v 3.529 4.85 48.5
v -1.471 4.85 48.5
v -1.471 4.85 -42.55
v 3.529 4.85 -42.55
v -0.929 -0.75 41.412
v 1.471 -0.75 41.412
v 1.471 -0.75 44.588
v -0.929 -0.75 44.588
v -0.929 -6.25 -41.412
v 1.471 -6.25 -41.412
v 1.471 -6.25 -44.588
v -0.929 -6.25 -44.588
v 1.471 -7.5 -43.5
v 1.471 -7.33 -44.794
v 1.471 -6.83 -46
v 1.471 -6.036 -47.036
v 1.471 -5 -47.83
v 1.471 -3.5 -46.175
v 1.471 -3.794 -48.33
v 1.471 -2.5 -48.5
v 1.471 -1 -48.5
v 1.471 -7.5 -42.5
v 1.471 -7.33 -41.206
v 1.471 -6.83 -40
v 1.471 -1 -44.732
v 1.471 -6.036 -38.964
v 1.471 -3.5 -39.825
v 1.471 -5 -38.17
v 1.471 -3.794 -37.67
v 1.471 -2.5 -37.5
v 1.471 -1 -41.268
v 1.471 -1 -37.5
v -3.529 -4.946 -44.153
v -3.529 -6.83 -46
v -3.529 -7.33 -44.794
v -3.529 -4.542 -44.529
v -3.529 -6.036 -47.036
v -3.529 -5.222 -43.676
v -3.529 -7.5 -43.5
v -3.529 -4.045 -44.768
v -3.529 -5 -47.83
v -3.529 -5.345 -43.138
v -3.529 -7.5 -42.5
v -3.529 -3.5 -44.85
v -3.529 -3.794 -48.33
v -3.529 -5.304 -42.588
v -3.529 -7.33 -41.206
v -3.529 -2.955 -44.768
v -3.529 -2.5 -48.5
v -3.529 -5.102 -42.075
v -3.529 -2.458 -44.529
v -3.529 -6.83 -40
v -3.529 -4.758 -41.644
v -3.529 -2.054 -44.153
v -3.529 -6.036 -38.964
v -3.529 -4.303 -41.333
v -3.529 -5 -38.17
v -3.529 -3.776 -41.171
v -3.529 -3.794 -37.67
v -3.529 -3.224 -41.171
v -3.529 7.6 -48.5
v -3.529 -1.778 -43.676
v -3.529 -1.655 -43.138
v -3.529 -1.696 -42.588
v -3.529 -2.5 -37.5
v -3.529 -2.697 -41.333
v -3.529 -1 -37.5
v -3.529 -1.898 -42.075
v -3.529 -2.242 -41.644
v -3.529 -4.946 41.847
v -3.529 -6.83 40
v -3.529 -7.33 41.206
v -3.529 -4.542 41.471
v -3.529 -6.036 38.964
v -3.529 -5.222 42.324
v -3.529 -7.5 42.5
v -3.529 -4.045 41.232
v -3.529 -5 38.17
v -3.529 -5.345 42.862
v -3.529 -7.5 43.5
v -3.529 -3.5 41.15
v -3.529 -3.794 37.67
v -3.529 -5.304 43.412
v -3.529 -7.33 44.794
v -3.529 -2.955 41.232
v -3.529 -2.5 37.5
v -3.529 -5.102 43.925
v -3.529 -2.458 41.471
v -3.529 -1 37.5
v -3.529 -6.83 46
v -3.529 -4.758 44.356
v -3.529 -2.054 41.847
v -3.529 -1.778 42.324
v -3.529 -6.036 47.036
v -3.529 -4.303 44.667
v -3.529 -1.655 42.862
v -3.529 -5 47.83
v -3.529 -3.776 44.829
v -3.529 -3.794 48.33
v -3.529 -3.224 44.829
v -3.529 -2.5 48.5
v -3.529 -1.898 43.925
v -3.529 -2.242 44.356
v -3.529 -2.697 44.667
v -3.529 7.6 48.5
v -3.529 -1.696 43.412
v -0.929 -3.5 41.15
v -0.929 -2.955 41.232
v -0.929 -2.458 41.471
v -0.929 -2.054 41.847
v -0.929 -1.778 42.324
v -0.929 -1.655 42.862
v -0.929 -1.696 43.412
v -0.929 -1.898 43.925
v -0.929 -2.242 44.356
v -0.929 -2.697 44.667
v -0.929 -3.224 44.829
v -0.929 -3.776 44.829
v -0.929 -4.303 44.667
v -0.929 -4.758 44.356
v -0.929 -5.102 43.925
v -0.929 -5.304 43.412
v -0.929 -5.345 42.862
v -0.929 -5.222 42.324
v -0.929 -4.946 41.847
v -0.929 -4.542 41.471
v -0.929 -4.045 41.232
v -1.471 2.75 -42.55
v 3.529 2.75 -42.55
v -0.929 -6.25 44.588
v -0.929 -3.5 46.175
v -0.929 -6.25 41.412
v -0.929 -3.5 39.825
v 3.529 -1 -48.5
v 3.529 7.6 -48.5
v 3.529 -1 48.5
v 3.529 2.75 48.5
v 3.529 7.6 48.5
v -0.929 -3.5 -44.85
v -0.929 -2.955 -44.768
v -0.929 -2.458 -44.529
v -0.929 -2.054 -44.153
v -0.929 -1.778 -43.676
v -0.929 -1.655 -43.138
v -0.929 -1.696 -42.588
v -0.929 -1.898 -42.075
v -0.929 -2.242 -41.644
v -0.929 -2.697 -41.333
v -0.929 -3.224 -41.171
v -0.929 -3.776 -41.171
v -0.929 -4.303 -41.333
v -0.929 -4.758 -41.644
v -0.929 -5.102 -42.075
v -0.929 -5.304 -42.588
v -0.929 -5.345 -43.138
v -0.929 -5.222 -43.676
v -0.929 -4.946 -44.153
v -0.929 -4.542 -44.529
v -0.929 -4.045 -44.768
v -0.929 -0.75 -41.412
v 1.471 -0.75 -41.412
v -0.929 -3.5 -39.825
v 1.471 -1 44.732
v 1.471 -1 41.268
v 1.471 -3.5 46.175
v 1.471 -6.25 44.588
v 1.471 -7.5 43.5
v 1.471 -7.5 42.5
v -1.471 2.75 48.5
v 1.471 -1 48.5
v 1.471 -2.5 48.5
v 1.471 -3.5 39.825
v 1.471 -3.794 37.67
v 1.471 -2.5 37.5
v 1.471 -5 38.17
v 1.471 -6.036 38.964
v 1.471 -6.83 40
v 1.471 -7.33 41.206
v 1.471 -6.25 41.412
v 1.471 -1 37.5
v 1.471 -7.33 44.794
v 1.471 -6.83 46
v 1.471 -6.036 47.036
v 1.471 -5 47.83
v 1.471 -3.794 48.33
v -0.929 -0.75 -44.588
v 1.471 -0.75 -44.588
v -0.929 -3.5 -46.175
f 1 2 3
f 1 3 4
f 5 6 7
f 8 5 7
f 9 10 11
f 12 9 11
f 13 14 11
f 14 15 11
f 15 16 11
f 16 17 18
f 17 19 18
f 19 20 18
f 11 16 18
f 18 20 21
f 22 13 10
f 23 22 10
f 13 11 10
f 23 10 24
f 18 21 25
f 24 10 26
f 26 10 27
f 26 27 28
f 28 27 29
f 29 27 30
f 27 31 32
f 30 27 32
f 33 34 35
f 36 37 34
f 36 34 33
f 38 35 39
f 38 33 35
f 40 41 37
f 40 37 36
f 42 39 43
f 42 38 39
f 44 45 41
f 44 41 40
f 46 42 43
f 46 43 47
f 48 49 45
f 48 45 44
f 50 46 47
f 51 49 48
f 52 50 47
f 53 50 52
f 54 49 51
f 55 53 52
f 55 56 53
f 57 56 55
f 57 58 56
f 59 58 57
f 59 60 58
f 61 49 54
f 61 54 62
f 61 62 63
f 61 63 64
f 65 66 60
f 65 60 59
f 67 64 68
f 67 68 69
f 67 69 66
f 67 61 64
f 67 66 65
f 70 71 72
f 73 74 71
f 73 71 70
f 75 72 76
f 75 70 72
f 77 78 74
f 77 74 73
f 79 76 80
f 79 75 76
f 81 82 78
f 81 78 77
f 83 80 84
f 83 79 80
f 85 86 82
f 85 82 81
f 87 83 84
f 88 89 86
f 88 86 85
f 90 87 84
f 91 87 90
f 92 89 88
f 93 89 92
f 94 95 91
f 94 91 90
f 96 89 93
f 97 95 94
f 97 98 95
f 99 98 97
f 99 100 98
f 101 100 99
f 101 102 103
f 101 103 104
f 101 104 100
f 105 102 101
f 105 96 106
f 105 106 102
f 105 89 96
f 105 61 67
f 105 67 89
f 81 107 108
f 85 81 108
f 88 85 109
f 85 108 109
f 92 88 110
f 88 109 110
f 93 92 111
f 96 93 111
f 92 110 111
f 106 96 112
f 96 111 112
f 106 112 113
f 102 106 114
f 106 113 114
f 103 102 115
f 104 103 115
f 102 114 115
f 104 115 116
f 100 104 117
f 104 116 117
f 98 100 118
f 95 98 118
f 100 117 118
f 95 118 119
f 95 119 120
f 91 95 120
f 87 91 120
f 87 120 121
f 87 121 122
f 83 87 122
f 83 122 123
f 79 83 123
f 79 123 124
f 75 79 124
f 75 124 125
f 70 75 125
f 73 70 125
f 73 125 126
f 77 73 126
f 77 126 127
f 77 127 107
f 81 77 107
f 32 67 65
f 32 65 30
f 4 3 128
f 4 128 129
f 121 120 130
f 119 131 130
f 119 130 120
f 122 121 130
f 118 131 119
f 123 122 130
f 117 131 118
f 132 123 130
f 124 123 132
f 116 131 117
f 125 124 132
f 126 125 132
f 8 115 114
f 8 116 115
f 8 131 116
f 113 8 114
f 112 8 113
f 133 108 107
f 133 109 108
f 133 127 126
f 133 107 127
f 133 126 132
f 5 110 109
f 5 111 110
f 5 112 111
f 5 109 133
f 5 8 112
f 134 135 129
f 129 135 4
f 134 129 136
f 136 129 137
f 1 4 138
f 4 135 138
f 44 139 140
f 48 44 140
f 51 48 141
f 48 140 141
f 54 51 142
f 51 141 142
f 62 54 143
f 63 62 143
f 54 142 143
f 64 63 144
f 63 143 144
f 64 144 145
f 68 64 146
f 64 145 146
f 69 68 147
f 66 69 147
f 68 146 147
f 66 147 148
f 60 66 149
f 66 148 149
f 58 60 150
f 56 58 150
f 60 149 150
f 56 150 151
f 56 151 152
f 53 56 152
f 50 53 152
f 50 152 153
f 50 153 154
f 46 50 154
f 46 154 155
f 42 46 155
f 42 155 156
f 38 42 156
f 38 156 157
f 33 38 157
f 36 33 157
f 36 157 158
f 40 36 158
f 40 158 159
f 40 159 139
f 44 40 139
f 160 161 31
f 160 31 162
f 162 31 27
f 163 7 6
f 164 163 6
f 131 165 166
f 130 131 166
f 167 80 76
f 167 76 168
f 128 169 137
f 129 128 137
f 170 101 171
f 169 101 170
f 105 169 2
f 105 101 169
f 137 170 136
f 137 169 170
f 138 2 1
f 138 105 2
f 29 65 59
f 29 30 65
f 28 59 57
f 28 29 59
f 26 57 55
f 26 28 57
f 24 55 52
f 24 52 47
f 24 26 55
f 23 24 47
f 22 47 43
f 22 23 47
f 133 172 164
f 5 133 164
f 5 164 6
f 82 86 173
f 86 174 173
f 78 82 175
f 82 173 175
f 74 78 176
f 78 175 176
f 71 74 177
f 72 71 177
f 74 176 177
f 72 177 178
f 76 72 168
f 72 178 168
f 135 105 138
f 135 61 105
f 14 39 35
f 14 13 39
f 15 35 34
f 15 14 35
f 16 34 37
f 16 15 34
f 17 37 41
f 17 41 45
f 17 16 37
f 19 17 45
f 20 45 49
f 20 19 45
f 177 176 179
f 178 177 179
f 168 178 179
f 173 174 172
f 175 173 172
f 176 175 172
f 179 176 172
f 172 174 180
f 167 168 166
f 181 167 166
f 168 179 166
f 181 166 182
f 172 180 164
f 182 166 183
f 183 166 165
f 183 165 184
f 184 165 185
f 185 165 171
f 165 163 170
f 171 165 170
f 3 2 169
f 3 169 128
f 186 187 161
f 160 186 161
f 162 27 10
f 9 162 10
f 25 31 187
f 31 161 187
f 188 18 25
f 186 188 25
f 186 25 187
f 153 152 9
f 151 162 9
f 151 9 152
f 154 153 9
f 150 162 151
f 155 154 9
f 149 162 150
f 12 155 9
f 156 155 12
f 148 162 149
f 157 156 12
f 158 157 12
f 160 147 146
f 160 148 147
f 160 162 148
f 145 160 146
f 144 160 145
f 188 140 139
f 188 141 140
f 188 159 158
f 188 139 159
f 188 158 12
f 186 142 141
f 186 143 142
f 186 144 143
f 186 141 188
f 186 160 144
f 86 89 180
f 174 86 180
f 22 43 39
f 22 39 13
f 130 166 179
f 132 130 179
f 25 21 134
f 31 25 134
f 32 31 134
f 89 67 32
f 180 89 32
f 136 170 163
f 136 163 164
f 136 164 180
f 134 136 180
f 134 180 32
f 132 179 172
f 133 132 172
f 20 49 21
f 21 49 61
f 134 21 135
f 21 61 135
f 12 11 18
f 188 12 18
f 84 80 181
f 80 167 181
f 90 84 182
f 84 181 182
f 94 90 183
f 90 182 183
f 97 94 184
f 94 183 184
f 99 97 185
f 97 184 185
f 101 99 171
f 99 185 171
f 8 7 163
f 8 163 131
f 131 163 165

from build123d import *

# Parameters (mm, degrees)
SKETCH1_W           = 7.0575
SKETCH1_H           = 97
BOSS_EXTRUDE2_DEPTH = 7.6
SKETCH4_W           = 5
SKETCH4_H           = 91.05
CUT_EXTRUDE1_DEPTH  = 4.85
SKETCH6_W           = 5
SKETCH6_H           = 91.05
BOSS_EXTRUDE3_DEPTH = 2.75
SKETCH8_W           = 7.0575
SKETCH8_H           = 97
BOSS_EXTRUDE4_DEPTH = 1
SKETCH9_W           = 5
SKETCH9_H           = 11
BOSS_EXTRUDE5_DEPTH = 6.5
CUT_EXTRUDE2_DEPTH  = 2.4
SKETCH11_R          = 1.85
CUT_EXTRUDE3_DEPTH  = 50.293805962
FILLET2_R           = 5


with BuildPart() as part:
    # Sketch1 → Boss-Extrude2 (new body)
    with BuildSketch(Plane(origin=(0, 0, 0), x_dir=(1, 0, 0), z_dir=(0, 1, 0))):
        Rectangle(SKETCH1_W, SKETCH1_H)
    extrude(amount=BOSS_EXTRUDE2_DEPTH)

    # Sketch4 → Cut-Extrude1 (cut)
    with BuildSketch(Plane(origin=(0, 7.6, 0), x_dir=(1, 0, 0), z_dir=(0, 1, 0))):
        with Locations((1.02875, -2.975)):
            Rectangle(SKETCH4_W, SKETCH4_H)
    extrude(amount=-CUT_EXTRUDE1_DEPTH, mode=Mode.SUBTRACT)

    # Sketch6 → Boss-Extrude3 (add)
    with BuildSketch(Plane(origin=(0, 7.6, 0), x_dir=(1, 0, 0), z_dir=(0, 1, 0))):
        with Locations((1.02875, -2.975)):
            Rectangle(SKETCH6_W, SKETCH6_H)
    extrude(amount=-BOSS_EXTRUDE3_DEPTH)

    # Sketch8 → Boss-Extrude4 (add)
    with BuildSketch(Plane.XZ):
        Rectangle(SKETCH8_W, SKETCH8_H)
    extrude(amount=BOSS_EXTRUDE4_DEPTH)

    # Sketch9 → Boss-Extrude5 (add)
    with BuildSketch(Plane.XZ.offset(1)):
        with Locations((-1.02875, 43)):
            Rectangle(SKETCH9_W, SKETCH9_H)
        with Locations((-1.02875, -43)):
            Rectangle(SKETCH9_W, SKETCH9_H)
    extrude(amount=BOSS_EXTRUDE5_DEPTH)

    # Sketch10 → Cut-Extrude2 (cut)
    with BuildSketch(Plane(origin=(1.47125, 0, 0), x_dir=(0, 0, -1), z_dir=(1, 0, 0))):
        Polygon((-44.58771324, -0.75), (-46.175426481, -3.5), (-44.58771324, -6.25), (-41.41228676, -6.25), (-39.824573519, -3.5), (-41.41228676, -0.75), align=None)
        Polygon((46.175426481, -3.5), (44.58771324, -0.75), (41.41228676, -0.75), (39.824573519, -3.5), (41.41228676, -6.25), (44.58771324, -6.25), align=None)
    extrude(amount=-CUT_EXTRUDE2_DEPTH, mode=Mode.SUBTRACT)

    # Sketch11 → Cut-Extrude3 (cut, through all)
    with BuildSketch(Plane(origin=(-0.92875, 0, 0), x_dir=(0, 0, -1), z_dir=(1, 0, 0))):
        with Locations((-43, -3.5)):
            Circle(SKETCH11_R)
        with Locations((43, -3.5)):
            Circle(SKETCH11_R)
    extrude(amount=-CUT_EXTRUDE3_DEPTH, mode=Mode.SUBTRACT)

    # Fillet2
    fillet2_edges = [part.edges().sort_by_distance(p)[0] for p in [
        (-1.02875, -7.5, 48.5),
        (-1.02875, -7.5, 37.5),
        (-1.02875, -7.5, -37.5),
        (-1.02875, -7.5, -48.5),
    ]]
    fillet(fillet2_edges, radius=FILLET2_R)


solid = part.part
